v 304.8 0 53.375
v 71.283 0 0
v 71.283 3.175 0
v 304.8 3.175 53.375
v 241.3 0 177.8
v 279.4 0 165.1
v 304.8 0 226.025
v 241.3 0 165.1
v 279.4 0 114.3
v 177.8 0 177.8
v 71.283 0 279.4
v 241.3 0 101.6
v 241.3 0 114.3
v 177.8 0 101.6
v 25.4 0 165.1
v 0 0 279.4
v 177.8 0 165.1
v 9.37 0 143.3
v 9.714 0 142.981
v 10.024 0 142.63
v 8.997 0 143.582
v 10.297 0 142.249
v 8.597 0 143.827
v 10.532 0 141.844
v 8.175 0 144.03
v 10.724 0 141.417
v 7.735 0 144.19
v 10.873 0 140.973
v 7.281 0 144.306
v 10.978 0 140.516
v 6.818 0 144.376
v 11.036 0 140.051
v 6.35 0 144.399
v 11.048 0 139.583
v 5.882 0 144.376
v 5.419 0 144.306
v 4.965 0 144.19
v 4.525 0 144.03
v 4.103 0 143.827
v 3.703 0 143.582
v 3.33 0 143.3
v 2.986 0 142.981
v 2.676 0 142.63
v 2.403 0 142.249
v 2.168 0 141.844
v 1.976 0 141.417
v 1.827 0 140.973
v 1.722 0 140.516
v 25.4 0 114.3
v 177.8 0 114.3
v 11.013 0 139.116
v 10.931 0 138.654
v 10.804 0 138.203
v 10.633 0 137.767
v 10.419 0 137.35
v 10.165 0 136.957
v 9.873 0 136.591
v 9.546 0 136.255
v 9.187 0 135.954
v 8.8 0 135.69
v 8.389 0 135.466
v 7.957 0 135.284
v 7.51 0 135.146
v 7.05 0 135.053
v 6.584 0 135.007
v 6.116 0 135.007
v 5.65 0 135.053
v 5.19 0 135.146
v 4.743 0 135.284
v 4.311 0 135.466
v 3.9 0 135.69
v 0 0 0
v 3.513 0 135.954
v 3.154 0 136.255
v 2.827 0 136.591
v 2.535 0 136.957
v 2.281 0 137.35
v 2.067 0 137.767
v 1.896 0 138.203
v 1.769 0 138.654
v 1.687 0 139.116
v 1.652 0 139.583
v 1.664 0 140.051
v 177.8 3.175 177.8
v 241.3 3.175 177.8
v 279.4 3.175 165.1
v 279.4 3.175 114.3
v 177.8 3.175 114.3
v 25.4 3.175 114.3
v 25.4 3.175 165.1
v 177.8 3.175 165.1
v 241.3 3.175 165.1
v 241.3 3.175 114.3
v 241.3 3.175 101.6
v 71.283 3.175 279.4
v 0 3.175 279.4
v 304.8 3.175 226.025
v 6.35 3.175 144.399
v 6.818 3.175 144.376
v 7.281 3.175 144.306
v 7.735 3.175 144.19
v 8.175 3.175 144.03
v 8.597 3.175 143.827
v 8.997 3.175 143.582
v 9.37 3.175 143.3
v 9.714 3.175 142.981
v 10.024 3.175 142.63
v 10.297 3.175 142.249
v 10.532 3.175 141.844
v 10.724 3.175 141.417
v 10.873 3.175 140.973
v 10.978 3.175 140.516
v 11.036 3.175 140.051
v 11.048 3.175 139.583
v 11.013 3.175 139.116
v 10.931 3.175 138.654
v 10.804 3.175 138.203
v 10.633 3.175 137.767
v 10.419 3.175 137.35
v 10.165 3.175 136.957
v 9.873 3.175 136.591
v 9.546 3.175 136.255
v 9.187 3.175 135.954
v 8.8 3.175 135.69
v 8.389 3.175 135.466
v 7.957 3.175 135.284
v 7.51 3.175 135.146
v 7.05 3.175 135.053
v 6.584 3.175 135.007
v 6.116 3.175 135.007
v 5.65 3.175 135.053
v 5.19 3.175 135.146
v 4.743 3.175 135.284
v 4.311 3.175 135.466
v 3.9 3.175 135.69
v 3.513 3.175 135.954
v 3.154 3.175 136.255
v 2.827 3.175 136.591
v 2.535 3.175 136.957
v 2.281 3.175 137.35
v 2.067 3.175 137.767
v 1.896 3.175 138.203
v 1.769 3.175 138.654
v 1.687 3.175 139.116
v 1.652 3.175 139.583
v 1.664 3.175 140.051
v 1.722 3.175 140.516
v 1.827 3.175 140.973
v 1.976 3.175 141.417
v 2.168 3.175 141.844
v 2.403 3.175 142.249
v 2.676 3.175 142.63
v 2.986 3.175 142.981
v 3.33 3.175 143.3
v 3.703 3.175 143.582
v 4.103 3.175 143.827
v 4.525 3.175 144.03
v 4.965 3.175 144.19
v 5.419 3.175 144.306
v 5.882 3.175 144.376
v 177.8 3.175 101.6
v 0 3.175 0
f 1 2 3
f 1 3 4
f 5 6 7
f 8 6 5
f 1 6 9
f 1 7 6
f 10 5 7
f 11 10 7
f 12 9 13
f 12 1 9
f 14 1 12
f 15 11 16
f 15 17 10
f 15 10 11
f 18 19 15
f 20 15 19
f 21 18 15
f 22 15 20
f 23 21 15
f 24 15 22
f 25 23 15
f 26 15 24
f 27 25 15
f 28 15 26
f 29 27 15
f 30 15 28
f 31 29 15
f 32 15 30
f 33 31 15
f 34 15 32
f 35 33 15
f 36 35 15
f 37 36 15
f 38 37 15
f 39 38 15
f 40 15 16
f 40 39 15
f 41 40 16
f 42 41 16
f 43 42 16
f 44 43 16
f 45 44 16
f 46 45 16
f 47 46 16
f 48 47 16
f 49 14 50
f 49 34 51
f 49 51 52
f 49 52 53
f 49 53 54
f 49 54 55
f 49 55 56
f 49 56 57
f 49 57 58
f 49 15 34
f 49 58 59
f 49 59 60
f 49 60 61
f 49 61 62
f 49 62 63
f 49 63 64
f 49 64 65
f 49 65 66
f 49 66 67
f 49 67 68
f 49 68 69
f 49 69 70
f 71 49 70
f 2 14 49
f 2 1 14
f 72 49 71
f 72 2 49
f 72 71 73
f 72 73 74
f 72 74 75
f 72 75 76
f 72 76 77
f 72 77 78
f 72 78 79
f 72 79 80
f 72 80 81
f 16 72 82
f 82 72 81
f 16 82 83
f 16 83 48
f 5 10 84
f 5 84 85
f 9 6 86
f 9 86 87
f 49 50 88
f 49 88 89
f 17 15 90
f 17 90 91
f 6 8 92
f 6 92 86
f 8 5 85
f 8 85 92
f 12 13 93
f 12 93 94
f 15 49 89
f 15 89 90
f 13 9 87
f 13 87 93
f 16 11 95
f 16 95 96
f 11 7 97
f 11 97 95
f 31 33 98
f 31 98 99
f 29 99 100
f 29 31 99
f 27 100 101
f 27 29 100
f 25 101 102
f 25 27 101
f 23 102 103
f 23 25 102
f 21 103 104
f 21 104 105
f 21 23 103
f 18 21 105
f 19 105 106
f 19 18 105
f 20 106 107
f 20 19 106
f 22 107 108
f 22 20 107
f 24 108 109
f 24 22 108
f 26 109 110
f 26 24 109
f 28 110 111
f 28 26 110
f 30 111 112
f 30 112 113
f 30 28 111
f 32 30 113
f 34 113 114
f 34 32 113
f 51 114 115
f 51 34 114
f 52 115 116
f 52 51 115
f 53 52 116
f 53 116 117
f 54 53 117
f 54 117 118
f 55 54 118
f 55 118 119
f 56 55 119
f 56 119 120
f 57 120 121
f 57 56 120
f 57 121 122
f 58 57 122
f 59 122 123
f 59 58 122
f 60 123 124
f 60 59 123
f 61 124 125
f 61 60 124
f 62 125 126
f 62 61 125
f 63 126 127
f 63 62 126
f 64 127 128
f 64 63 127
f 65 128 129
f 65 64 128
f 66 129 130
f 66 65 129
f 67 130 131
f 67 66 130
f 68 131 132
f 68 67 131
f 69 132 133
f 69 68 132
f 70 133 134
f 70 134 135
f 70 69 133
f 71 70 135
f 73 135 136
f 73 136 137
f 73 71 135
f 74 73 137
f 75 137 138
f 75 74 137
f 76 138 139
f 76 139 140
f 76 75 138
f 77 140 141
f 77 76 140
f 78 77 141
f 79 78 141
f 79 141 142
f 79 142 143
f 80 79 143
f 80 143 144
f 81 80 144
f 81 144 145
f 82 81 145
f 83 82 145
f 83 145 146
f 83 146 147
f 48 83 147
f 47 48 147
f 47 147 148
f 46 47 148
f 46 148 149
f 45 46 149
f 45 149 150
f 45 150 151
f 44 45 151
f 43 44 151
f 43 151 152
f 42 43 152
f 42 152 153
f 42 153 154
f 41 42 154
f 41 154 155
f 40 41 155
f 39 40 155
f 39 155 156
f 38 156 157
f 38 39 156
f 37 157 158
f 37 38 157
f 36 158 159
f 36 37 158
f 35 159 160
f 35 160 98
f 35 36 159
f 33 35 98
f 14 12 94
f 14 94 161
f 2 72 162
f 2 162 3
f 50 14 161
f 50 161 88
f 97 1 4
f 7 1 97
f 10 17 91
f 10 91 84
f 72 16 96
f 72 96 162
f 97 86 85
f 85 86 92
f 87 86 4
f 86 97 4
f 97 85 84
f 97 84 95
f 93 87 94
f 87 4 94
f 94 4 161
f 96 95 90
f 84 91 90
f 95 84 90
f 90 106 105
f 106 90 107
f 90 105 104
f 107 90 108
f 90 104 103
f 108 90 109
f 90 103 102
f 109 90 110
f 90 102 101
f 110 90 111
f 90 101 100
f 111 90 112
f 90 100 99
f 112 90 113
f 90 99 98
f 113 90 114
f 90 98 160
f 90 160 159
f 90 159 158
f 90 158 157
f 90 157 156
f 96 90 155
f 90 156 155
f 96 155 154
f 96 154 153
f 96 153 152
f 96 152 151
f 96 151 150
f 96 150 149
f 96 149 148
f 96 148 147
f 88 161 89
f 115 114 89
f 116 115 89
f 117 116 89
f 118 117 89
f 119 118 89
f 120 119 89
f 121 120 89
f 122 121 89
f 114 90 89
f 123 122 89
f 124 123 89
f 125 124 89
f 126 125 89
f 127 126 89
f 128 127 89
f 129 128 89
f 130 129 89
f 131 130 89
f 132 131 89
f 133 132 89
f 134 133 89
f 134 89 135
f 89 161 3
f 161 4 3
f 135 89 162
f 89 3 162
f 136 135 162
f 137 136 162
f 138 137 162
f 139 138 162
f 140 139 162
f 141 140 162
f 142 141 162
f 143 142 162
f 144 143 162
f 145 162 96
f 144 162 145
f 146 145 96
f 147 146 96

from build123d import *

# Parameters (mm, degrees)
SKETCH1_R           = 4.699
BOSS_EXTRUDE1_DEPTH = 3.175


with BuildPart() as part:
    # Sketch1 → Boss-Extrude1 (new body)
    with BuildSketch(Plane(origin=(0, 0, 0), x_dir=(1, 0, 0), z_dir=(0, 1, 0))):
        Polygon((0, 0), (71.282950754, 0), (304.8, -53.375325558), (304.8, -226.024674442), (71.282950754, -279.4), (0, -279.4), align=None)
        with Locations(Location((6.35, -139.7, 0), (0, 0, 270))):
            Circle(SKETCH1_R, mode=Mode.SUBTRACT)
        Polygon((25.4, -165.1), (177.8, -165.1), (177.8, -177.8), (241.3, -177.8), (241.3, -165.1), (279.4, -165.1), (279.4, -114.3), (241.3, -114.3), (241.3, -101.6), (177.8, -101.6), (177.8, -114.3), (25.4, -114.3), align=None, mode=Mode.SUBTRACT)
    extrude(amount=BOSS_EXTRUDE1_DEPTH)


solid = part.part
